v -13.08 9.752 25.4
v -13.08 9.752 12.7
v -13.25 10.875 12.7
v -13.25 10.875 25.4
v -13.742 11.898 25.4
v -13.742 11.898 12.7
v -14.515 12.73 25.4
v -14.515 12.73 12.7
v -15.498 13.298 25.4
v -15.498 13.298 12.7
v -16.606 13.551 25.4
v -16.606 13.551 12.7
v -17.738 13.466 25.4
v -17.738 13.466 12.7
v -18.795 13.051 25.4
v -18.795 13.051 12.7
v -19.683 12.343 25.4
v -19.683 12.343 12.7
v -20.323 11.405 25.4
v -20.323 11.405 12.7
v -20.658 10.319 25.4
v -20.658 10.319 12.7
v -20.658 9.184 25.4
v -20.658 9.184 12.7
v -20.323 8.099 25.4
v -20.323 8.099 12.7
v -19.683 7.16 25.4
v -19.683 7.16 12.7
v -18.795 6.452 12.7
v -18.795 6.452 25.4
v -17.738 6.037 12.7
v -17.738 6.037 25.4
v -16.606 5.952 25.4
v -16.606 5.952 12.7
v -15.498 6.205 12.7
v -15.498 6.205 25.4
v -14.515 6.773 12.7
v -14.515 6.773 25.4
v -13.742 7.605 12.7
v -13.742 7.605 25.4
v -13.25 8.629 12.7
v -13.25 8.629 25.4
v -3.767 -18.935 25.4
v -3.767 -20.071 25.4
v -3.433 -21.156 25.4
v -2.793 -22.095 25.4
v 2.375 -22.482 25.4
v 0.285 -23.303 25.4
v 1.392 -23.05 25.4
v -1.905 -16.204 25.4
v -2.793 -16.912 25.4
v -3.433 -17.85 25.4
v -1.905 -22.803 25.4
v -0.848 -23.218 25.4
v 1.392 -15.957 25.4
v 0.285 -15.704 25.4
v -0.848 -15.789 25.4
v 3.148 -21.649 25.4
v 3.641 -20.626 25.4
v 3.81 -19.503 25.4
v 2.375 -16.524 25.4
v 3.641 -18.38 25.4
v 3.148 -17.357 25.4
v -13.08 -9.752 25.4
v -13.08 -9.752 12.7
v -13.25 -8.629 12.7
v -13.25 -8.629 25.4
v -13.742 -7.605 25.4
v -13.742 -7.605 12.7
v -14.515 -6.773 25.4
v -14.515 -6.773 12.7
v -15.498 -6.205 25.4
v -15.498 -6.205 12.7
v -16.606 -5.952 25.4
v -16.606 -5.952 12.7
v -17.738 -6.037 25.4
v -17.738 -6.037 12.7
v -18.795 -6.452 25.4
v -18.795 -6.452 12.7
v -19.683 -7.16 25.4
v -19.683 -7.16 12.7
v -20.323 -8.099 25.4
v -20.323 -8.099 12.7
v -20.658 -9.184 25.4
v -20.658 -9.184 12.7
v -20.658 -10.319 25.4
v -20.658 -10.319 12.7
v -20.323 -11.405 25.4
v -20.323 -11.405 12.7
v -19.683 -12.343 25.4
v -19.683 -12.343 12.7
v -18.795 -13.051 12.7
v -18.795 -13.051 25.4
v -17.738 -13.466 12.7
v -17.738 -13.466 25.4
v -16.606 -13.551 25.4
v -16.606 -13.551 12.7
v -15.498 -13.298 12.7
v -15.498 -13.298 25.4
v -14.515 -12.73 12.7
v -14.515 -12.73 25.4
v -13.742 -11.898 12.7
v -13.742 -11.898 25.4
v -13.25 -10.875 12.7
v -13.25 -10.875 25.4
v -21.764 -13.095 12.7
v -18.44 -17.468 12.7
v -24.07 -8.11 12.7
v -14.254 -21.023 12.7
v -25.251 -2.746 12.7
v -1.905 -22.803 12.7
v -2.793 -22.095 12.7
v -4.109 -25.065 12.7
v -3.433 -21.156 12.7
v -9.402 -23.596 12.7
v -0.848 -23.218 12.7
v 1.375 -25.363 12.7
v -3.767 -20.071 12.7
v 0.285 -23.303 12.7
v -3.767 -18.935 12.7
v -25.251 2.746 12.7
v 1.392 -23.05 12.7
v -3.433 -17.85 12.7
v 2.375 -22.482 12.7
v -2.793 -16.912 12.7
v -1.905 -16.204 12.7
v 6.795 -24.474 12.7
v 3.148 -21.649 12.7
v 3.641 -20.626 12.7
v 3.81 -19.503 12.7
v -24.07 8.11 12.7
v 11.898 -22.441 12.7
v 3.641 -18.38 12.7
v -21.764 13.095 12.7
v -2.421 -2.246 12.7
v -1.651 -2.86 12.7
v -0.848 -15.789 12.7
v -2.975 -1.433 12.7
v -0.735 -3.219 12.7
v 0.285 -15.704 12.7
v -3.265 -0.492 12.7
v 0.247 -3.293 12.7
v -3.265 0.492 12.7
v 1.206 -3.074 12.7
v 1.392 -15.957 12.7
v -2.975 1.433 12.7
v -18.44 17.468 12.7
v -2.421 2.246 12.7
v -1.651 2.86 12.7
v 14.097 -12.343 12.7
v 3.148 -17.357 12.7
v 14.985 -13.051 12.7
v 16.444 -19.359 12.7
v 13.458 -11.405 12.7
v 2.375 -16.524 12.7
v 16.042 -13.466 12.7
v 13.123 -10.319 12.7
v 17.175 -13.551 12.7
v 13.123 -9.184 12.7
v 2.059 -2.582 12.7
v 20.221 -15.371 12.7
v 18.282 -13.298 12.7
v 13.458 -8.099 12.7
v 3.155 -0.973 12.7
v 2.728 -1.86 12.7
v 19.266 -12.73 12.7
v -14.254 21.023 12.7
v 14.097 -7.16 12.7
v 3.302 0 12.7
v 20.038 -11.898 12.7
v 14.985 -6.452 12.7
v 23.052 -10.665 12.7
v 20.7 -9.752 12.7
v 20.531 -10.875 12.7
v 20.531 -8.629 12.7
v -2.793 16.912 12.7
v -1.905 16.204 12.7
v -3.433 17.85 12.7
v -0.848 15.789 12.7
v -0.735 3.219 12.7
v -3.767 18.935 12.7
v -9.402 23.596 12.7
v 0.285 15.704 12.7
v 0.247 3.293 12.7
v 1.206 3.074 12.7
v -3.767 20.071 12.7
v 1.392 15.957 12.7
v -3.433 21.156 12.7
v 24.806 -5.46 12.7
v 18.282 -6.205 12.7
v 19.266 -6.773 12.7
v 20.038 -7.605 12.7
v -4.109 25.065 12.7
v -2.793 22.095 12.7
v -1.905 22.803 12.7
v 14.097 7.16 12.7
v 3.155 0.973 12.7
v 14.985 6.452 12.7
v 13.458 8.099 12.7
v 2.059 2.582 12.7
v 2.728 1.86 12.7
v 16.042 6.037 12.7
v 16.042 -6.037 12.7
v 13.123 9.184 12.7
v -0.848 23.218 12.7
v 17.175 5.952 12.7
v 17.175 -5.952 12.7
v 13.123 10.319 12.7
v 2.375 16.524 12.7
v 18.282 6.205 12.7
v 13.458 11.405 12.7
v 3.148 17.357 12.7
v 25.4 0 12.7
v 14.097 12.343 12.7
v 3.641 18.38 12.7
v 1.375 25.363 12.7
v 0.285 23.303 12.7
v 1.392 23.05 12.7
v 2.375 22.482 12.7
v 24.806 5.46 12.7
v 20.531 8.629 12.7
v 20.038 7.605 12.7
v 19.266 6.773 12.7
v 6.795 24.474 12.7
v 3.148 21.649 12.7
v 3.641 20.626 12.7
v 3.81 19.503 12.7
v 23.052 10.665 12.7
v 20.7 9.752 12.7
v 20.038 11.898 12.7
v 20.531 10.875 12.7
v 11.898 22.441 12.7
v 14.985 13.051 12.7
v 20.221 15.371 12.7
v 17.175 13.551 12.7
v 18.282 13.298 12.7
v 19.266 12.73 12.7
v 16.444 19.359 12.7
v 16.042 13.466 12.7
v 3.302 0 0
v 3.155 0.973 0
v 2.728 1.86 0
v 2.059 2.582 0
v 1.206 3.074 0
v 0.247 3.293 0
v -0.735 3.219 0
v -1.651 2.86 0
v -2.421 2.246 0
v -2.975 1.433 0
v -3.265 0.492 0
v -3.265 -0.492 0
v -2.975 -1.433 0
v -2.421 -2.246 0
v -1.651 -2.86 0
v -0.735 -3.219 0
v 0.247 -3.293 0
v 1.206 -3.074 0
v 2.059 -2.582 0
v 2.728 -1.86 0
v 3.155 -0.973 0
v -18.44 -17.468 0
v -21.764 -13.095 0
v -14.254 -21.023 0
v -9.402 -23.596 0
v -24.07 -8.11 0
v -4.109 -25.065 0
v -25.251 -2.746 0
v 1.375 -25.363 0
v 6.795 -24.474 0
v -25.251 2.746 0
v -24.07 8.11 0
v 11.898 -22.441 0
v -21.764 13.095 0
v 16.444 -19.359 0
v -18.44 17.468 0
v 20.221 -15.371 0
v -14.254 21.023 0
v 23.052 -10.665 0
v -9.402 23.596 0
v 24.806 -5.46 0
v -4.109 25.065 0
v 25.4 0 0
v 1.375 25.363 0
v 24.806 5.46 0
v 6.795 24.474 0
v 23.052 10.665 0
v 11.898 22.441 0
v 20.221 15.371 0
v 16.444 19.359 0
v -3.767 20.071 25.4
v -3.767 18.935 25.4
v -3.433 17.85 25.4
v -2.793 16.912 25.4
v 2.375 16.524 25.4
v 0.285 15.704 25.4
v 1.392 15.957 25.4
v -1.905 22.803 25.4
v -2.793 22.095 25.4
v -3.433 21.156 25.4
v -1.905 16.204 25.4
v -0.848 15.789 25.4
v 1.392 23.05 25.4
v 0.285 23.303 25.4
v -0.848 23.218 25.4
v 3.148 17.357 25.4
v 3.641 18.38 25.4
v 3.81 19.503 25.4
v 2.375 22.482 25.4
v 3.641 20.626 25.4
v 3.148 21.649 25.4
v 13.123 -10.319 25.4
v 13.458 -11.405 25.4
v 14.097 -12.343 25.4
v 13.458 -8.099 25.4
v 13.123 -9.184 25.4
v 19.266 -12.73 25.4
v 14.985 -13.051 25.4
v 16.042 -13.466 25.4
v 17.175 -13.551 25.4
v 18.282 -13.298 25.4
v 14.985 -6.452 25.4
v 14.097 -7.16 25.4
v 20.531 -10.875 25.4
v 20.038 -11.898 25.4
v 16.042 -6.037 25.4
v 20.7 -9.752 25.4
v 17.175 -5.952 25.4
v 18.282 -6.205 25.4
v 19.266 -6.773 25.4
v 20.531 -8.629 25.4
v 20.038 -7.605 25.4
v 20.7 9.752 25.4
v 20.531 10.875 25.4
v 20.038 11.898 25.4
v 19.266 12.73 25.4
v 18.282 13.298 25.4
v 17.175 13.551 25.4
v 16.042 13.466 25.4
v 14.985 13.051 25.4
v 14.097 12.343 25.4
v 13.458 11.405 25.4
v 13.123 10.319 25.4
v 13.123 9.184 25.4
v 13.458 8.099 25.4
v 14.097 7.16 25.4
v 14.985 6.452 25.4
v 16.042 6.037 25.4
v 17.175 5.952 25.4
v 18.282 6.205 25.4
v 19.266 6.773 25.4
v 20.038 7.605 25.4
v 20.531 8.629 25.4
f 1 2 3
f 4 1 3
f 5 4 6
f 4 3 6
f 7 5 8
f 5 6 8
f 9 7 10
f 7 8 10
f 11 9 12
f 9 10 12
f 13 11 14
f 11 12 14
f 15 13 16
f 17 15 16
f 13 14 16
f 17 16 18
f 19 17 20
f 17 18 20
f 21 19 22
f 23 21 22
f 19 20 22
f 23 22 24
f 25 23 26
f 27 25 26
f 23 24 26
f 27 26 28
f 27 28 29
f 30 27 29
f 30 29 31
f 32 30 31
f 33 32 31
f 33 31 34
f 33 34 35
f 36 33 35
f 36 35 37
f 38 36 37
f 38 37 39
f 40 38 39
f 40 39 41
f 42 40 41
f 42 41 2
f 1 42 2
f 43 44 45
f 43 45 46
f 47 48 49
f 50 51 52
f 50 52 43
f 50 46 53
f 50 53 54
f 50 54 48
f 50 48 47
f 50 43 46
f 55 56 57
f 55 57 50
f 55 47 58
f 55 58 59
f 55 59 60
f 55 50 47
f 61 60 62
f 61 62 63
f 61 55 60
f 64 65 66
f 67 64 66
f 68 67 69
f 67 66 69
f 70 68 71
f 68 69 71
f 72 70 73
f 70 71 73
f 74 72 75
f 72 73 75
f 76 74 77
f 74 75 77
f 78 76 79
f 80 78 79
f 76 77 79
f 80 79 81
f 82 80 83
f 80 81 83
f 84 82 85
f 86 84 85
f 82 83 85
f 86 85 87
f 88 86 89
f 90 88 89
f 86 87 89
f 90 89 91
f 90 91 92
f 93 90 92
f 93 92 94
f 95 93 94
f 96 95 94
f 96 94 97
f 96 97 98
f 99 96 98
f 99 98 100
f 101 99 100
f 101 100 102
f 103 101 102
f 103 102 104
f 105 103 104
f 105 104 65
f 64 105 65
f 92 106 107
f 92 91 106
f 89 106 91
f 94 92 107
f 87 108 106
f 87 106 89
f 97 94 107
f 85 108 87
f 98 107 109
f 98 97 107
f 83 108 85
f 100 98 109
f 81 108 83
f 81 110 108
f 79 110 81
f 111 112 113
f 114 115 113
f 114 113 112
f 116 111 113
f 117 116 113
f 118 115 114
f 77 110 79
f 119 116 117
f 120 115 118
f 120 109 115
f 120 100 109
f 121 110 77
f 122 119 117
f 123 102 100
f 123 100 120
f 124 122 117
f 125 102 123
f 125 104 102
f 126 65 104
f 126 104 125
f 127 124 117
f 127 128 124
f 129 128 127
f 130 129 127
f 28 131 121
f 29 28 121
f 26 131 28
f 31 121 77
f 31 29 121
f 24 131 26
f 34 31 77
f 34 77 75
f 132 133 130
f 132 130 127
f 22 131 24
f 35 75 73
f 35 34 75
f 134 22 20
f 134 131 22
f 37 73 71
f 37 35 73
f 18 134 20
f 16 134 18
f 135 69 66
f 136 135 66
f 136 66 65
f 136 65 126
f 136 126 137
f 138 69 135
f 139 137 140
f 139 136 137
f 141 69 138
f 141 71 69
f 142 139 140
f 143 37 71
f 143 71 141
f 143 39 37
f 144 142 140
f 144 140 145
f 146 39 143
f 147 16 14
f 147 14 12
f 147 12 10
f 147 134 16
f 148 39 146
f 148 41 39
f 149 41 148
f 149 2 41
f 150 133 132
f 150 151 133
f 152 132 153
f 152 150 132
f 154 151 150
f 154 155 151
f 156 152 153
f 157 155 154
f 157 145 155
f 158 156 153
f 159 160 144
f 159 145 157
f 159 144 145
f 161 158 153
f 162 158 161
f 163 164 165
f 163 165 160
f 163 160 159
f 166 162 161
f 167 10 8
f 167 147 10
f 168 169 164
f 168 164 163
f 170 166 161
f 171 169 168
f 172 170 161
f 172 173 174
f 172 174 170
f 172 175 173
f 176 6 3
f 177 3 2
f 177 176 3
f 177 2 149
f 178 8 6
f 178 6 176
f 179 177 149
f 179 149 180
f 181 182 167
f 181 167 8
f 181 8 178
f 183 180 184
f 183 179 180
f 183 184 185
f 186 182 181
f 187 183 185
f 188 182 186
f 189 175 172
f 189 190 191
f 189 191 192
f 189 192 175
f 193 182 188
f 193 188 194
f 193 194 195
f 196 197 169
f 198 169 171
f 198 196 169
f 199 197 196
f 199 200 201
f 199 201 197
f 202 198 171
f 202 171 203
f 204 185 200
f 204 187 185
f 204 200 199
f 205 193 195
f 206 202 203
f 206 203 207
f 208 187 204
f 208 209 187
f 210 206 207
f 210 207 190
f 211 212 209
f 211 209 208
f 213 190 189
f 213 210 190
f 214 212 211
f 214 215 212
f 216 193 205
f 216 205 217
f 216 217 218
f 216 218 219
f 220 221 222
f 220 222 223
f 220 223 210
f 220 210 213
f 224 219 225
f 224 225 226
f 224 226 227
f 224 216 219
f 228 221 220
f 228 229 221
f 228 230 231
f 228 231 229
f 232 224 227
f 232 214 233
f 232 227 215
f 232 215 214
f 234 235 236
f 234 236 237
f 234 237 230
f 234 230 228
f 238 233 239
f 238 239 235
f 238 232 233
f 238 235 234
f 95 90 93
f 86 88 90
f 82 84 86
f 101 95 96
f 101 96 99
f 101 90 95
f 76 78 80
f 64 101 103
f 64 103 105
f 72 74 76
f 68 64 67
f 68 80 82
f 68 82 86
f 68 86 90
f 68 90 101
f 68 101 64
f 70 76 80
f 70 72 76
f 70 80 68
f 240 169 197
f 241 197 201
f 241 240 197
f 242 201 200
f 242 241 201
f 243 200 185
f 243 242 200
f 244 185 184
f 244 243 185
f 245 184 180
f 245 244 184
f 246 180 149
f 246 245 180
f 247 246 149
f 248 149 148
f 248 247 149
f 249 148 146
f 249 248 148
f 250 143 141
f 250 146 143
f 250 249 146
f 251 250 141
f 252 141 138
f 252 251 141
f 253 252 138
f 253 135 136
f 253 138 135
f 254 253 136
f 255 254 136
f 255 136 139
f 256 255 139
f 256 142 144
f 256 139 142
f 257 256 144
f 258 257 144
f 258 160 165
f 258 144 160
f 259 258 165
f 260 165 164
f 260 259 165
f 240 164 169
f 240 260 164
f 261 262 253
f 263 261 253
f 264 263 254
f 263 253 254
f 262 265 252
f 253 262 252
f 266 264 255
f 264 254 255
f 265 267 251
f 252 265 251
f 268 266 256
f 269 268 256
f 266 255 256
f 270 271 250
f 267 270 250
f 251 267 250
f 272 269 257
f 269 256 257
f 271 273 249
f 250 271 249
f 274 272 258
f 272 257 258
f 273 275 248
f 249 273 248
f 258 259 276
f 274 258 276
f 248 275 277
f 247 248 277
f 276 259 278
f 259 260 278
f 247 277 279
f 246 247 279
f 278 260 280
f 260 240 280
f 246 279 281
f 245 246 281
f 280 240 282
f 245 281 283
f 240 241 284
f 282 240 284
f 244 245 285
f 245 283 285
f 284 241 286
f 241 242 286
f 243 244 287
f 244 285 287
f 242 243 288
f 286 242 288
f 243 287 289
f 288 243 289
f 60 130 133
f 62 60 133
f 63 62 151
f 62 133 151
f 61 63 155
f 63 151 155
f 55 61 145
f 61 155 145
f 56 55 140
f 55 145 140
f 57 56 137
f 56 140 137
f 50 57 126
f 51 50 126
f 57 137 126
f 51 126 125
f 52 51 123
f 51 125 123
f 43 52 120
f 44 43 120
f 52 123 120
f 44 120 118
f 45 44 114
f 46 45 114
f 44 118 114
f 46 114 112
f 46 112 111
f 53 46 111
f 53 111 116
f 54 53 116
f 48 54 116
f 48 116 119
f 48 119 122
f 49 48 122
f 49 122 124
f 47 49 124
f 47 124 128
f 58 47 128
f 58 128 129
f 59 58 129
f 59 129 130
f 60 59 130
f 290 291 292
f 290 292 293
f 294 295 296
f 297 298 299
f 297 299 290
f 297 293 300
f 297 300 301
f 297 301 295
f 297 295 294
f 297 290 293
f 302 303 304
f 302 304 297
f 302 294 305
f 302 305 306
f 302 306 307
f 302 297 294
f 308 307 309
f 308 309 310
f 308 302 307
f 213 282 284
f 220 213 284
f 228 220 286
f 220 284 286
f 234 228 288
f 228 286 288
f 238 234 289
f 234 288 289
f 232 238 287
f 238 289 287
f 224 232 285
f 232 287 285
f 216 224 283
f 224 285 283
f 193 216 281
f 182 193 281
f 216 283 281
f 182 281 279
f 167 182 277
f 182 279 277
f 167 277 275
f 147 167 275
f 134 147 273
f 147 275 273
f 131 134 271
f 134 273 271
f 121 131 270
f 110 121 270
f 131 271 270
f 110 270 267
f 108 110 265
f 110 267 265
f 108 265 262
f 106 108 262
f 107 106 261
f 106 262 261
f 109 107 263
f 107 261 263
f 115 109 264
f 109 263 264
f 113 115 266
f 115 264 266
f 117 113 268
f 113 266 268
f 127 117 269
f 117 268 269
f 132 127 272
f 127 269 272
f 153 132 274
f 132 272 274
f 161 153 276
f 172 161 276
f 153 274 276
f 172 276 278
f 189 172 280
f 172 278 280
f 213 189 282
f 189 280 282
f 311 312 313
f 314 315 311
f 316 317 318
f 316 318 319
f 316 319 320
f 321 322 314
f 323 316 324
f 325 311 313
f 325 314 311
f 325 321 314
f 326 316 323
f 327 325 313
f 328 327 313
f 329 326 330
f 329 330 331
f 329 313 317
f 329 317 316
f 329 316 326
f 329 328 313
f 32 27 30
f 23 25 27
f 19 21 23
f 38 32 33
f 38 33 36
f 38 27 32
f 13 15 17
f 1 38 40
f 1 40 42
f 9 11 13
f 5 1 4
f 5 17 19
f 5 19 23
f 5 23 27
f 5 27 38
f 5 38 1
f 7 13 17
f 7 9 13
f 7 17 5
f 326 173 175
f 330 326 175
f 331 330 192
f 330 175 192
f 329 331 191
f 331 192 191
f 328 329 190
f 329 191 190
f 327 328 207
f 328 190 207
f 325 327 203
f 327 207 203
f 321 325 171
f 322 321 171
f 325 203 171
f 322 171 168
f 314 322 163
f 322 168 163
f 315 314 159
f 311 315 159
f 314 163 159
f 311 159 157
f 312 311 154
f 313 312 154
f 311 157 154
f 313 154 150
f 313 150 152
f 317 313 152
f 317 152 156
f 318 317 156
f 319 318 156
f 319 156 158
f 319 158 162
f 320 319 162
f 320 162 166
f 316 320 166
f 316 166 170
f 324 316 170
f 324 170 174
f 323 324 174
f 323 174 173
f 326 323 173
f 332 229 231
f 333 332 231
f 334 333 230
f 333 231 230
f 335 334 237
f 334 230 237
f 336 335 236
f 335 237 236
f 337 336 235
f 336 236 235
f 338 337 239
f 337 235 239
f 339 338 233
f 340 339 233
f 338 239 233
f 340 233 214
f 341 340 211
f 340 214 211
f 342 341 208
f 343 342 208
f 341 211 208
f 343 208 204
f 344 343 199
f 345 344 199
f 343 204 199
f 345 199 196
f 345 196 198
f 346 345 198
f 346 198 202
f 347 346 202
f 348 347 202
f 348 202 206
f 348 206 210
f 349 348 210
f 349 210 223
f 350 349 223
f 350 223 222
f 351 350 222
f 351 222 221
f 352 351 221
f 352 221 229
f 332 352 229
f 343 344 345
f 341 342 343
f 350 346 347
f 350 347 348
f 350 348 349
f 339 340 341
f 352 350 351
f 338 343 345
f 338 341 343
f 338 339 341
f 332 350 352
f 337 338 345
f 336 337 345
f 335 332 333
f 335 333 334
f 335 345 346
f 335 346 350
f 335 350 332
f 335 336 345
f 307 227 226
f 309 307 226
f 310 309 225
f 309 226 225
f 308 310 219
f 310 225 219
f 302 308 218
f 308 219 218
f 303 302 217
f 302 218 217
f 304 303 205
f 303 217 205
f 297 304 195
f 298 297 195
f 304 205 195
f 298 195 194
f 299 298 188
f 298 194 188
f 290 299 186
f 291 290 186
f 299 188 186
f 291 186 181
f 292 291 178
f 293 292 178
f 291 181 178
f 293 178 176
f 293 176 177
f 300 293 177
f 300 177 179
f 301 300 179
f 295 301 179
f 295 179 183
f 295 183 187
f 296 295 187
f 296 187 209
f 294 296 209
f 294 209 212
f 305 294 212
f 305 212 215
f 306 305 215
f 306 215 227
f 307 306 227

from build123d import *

# Parameters (mm, degrees)
F0_R     = 25.4
F2_DEPTH = 12.7
F1_R     = 3.81
F3_DEPTH = 25.4
F4_R     = 3.302
F5_DEPTH = 25.4


with BuildPart() as f2:
    # F0 (on Top) → F2 (new body)
    with BuildSketch(Plane.XY):
        Circle(F0_R)
    extrude(amount=F2_DEPTH)

    # F1 (on Top) → F3 (join)
    with BuildSketch(Plane.XY):
        with Locations((0, 19.503224)):
            Circle(F1_R)
        with Locations((-16.890287, 9.751612)):
            Circle(F1_R)
        with Locations((-16.890287, -9.751612)):
            Circle(F1_R)
        with Locations((0, -19.503224)):
            Circle(F1_R)
        with Locations((16.890287, -9.751612)):
            Circle(F1_R)
        with Locations((16.890287, 9.751612)):
            Circle(F1_R)
    extrude(amount=F3_DEPTH)

    # F4 (on Top) → F5 (cut)
    with BuildSketch(Plane.XY):
        Circle(F4_R)
    extrude(amount=F5_DEPTH, mode=Mode.SUBTRACT)


solid = f2.part
